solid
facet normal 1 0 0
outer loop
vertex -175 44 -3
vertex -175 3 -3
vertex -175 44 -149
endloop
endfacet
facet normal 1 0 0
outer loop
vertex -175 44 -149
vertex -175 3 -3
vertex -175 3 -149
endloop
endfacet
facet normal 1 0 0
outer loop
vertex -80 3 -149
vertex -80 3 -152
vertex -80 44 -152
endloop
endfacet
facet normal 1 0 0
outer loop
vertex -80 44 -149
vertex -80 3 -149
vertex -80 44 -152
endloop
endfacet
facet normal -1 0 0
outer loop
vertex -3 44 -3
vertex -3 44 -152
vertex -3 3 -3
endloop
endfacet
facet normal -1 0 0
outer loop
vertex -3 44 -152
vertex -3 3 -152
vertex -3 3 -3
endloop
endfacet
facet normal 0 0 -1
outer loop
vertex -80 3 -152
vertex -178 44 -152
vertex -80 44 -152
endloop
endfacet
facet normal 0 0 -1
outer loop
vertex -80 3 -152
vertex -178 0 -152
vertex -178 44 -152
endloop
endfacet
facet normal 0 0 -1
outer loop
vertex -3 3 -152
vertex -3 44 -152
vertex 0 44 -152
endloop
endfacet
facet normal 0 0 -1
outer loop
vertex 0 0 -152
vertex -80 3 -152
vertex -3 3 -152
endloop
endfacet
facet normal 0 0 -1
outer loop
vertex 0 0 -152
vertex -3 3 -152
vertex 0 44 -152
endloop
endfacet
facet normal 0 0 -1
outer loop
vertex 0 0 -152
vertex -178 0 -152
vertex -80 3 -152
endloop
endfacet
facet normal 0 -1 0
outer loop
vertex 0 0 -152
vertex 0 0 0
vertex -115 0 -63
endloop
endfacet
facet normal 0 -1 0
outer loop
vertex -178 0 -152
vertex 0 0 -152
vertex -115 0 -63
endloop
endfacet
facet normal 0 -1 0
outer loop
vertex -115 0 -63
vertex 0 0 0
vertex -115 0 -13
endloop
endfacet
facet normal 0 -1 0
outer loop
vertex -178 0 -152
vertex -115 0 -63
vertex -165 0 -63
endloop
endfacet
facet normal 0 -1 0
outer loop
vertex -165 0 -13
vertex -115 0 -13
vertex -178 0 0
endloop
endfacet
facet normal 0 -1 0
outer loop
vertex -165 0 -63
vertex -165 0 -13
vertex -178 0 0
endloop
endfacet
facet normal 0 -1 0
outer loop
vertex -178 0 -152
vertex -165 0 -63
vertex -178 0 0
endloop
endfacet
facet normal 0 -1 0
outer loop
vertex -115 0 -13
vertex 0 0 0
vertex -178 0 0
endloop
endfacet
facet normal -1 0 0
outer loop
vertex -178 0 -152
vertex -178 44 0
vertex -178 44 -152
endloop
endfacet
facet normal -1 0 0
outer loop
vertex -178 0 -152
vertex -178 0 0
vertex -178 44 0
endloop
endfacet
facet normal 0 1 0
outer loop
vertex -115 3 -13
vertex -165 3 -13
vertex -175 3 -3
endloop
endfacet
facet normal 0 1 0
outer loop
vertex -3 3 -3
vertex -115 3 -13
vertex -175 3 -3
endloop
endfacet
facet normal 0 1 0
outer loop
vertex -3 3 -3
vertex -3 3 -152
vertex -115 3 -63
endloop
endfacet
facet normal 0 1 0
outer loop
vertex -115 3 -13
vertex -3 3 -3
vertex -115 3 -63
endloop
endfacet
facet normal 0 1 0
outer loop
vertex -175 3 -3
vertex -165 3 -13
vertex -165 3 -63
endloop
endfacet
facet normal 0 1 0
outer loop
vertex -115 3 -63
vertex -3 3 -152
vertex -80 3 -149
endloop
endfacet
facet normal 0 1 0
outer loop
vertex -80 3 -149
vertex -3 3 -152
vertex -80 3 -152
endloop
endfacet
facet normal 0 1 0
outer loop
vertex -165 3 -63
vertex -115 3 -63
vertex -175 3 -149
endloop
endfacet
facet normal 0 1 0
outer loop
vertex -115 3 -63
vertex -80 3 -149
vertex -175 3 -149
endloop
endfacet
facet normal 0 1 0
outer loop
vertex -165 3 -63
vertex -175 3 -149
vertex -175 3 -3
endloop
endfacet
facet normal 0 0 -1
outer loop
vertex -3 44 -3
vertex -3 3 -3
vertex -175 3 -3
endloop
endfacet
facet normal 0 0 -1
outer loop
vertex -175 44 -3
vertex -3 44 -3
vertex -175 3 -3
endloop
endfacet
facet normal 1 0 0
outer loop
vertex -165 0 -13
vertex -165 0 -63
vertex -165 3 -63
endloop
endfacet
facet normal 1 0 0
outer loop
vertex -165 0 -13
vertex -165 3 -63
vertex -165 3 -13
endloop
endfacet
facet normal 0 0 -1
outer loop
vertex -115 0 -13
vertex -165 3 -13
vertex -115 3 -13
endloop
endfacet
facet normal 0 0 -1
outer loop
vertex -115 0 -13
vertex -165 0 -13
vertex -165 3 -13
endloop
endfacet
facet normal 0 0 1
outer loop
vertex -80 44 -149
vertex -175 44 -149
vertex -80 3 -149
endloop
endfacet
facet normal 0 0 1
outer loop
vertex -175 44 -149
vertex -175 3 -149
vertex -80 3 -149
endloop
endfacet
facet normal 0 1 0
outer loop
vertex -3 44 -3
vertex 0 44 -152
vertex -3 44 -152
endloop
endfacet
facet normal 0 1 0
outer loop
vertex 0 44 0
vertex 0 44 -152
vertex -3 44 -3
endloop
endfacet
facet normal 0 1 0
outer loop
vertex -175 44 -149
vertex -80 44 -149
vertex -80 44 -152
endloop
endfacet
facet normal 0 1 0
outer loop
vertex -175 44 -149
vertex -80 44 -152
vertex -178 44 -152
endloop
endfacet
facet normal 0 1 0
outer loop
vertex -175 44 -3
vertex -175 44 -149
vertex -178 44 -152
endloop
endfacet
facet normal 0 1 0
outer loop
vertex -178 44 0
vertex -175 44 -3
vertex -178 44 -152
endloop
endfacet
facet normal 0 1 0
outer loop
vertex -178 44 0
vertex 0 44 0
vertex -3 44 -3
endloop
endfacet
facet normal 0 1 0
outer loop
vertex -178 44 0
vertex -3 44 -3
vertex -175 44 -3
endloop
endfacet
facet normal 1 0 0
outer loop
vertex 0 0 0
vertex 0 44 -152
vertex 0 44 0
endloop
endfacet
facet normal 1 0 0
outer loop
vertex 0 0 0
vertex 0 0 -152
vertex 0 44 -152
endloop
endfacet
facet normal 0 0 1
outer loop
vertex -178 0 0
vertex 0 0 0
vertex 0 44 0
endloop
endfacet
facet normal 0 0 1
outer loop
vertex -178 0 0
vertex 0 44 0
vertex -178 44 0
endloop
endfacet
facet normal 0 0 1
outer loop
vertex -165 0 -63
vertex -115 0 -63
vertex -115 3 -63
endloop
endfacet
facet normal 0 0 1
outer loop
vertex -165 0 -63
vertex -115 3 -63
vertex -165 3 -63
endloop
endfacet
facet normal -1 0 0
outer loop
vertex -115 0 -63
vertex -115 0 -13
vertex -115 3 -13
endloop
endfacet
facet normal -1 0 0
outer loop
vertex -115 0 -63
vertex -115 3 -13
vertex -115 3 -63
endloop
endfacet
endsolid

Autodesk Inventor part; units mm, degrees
ref_plane "YZ Plane" through (0, 0, 0) normal (1, 0, 0) x (0, 1, 0)
ref_plane "XZ Plane" through (0, 0, 0) normal (0, 1, 0) x (-1, 0, 0)
ref_plane "XY Plane" through (0, 0, 0) normal (0, 0, 1) x (1, 0, 0)
sketch "Sketch1" plane through (0, 0, 0) normal (0, 1, 0) x (-1, 0, 0)
  line L0 (0, 0) -> (178, 0)
  line L1 (178, 0) -> (178, -152)
  line L2 (178, -152) -> (0, -152)
  line L3 (0, -152) -> (0, 0)
  dimension "d1" = 152
  dimension "d2" = 178
extrude "Extrusion1" add sketch "Sketch1" along normal blind 44
shell "Shell1" thickness 3 removed faces 1 at (-118.6667, 44, -101.3333)
sketch "Sketch3" plane through (0, 0, -152) normal (0, 0, -1) x (-1, 0, 0)
  line L0 (3, 3) -> (3, 44) projected
  line L1 (0, 44) -> (178, 44) projected
  line L2 (3, 3) -> (80, 3)
  line L3 (80, 3) -> (80, 44)
  line L4 (80, 44) -> (3, 44)
  line L5 (3, 44) -> (3, 3)
  point P0 (0, 0)
  dimension "d9" = 77
extrude "Extrusion3" cut sketch "Sketch3" against normal blind 4
sketch "Sketch4" plane through (0, 0, 0) normal (0, -1, 0) x (1, 0, 0)
  line L0 (-175, -3) -> (-175, -149) projected
  line L1 (-175, -3) -> (-165, -3)
  line L2 (-165, -3) -> (-165, -13)
  line L3 (-165, -13) -> (-175, -13)
  line L4 (-175, -13) -> (-175, -3)
  line L5 (-165, -13) -> (-115, -13)
  line L6 (-115, -13) -> (-115, -63)
  line L7 (-115, -63) -> (-165, -63)
  line L8 (-165, -63) -> (-165, -13)
  point P0 (0, 0)
  dimension "d12" = 10
  dimension "d13" = 10
  dimension "d14" = 50
  dimension "d15" = 50
extrude "Extrusion4" cut sketch "Sketch4" against normal blind 4 contours L5 L6 L7 L8
properties part number "back side"
